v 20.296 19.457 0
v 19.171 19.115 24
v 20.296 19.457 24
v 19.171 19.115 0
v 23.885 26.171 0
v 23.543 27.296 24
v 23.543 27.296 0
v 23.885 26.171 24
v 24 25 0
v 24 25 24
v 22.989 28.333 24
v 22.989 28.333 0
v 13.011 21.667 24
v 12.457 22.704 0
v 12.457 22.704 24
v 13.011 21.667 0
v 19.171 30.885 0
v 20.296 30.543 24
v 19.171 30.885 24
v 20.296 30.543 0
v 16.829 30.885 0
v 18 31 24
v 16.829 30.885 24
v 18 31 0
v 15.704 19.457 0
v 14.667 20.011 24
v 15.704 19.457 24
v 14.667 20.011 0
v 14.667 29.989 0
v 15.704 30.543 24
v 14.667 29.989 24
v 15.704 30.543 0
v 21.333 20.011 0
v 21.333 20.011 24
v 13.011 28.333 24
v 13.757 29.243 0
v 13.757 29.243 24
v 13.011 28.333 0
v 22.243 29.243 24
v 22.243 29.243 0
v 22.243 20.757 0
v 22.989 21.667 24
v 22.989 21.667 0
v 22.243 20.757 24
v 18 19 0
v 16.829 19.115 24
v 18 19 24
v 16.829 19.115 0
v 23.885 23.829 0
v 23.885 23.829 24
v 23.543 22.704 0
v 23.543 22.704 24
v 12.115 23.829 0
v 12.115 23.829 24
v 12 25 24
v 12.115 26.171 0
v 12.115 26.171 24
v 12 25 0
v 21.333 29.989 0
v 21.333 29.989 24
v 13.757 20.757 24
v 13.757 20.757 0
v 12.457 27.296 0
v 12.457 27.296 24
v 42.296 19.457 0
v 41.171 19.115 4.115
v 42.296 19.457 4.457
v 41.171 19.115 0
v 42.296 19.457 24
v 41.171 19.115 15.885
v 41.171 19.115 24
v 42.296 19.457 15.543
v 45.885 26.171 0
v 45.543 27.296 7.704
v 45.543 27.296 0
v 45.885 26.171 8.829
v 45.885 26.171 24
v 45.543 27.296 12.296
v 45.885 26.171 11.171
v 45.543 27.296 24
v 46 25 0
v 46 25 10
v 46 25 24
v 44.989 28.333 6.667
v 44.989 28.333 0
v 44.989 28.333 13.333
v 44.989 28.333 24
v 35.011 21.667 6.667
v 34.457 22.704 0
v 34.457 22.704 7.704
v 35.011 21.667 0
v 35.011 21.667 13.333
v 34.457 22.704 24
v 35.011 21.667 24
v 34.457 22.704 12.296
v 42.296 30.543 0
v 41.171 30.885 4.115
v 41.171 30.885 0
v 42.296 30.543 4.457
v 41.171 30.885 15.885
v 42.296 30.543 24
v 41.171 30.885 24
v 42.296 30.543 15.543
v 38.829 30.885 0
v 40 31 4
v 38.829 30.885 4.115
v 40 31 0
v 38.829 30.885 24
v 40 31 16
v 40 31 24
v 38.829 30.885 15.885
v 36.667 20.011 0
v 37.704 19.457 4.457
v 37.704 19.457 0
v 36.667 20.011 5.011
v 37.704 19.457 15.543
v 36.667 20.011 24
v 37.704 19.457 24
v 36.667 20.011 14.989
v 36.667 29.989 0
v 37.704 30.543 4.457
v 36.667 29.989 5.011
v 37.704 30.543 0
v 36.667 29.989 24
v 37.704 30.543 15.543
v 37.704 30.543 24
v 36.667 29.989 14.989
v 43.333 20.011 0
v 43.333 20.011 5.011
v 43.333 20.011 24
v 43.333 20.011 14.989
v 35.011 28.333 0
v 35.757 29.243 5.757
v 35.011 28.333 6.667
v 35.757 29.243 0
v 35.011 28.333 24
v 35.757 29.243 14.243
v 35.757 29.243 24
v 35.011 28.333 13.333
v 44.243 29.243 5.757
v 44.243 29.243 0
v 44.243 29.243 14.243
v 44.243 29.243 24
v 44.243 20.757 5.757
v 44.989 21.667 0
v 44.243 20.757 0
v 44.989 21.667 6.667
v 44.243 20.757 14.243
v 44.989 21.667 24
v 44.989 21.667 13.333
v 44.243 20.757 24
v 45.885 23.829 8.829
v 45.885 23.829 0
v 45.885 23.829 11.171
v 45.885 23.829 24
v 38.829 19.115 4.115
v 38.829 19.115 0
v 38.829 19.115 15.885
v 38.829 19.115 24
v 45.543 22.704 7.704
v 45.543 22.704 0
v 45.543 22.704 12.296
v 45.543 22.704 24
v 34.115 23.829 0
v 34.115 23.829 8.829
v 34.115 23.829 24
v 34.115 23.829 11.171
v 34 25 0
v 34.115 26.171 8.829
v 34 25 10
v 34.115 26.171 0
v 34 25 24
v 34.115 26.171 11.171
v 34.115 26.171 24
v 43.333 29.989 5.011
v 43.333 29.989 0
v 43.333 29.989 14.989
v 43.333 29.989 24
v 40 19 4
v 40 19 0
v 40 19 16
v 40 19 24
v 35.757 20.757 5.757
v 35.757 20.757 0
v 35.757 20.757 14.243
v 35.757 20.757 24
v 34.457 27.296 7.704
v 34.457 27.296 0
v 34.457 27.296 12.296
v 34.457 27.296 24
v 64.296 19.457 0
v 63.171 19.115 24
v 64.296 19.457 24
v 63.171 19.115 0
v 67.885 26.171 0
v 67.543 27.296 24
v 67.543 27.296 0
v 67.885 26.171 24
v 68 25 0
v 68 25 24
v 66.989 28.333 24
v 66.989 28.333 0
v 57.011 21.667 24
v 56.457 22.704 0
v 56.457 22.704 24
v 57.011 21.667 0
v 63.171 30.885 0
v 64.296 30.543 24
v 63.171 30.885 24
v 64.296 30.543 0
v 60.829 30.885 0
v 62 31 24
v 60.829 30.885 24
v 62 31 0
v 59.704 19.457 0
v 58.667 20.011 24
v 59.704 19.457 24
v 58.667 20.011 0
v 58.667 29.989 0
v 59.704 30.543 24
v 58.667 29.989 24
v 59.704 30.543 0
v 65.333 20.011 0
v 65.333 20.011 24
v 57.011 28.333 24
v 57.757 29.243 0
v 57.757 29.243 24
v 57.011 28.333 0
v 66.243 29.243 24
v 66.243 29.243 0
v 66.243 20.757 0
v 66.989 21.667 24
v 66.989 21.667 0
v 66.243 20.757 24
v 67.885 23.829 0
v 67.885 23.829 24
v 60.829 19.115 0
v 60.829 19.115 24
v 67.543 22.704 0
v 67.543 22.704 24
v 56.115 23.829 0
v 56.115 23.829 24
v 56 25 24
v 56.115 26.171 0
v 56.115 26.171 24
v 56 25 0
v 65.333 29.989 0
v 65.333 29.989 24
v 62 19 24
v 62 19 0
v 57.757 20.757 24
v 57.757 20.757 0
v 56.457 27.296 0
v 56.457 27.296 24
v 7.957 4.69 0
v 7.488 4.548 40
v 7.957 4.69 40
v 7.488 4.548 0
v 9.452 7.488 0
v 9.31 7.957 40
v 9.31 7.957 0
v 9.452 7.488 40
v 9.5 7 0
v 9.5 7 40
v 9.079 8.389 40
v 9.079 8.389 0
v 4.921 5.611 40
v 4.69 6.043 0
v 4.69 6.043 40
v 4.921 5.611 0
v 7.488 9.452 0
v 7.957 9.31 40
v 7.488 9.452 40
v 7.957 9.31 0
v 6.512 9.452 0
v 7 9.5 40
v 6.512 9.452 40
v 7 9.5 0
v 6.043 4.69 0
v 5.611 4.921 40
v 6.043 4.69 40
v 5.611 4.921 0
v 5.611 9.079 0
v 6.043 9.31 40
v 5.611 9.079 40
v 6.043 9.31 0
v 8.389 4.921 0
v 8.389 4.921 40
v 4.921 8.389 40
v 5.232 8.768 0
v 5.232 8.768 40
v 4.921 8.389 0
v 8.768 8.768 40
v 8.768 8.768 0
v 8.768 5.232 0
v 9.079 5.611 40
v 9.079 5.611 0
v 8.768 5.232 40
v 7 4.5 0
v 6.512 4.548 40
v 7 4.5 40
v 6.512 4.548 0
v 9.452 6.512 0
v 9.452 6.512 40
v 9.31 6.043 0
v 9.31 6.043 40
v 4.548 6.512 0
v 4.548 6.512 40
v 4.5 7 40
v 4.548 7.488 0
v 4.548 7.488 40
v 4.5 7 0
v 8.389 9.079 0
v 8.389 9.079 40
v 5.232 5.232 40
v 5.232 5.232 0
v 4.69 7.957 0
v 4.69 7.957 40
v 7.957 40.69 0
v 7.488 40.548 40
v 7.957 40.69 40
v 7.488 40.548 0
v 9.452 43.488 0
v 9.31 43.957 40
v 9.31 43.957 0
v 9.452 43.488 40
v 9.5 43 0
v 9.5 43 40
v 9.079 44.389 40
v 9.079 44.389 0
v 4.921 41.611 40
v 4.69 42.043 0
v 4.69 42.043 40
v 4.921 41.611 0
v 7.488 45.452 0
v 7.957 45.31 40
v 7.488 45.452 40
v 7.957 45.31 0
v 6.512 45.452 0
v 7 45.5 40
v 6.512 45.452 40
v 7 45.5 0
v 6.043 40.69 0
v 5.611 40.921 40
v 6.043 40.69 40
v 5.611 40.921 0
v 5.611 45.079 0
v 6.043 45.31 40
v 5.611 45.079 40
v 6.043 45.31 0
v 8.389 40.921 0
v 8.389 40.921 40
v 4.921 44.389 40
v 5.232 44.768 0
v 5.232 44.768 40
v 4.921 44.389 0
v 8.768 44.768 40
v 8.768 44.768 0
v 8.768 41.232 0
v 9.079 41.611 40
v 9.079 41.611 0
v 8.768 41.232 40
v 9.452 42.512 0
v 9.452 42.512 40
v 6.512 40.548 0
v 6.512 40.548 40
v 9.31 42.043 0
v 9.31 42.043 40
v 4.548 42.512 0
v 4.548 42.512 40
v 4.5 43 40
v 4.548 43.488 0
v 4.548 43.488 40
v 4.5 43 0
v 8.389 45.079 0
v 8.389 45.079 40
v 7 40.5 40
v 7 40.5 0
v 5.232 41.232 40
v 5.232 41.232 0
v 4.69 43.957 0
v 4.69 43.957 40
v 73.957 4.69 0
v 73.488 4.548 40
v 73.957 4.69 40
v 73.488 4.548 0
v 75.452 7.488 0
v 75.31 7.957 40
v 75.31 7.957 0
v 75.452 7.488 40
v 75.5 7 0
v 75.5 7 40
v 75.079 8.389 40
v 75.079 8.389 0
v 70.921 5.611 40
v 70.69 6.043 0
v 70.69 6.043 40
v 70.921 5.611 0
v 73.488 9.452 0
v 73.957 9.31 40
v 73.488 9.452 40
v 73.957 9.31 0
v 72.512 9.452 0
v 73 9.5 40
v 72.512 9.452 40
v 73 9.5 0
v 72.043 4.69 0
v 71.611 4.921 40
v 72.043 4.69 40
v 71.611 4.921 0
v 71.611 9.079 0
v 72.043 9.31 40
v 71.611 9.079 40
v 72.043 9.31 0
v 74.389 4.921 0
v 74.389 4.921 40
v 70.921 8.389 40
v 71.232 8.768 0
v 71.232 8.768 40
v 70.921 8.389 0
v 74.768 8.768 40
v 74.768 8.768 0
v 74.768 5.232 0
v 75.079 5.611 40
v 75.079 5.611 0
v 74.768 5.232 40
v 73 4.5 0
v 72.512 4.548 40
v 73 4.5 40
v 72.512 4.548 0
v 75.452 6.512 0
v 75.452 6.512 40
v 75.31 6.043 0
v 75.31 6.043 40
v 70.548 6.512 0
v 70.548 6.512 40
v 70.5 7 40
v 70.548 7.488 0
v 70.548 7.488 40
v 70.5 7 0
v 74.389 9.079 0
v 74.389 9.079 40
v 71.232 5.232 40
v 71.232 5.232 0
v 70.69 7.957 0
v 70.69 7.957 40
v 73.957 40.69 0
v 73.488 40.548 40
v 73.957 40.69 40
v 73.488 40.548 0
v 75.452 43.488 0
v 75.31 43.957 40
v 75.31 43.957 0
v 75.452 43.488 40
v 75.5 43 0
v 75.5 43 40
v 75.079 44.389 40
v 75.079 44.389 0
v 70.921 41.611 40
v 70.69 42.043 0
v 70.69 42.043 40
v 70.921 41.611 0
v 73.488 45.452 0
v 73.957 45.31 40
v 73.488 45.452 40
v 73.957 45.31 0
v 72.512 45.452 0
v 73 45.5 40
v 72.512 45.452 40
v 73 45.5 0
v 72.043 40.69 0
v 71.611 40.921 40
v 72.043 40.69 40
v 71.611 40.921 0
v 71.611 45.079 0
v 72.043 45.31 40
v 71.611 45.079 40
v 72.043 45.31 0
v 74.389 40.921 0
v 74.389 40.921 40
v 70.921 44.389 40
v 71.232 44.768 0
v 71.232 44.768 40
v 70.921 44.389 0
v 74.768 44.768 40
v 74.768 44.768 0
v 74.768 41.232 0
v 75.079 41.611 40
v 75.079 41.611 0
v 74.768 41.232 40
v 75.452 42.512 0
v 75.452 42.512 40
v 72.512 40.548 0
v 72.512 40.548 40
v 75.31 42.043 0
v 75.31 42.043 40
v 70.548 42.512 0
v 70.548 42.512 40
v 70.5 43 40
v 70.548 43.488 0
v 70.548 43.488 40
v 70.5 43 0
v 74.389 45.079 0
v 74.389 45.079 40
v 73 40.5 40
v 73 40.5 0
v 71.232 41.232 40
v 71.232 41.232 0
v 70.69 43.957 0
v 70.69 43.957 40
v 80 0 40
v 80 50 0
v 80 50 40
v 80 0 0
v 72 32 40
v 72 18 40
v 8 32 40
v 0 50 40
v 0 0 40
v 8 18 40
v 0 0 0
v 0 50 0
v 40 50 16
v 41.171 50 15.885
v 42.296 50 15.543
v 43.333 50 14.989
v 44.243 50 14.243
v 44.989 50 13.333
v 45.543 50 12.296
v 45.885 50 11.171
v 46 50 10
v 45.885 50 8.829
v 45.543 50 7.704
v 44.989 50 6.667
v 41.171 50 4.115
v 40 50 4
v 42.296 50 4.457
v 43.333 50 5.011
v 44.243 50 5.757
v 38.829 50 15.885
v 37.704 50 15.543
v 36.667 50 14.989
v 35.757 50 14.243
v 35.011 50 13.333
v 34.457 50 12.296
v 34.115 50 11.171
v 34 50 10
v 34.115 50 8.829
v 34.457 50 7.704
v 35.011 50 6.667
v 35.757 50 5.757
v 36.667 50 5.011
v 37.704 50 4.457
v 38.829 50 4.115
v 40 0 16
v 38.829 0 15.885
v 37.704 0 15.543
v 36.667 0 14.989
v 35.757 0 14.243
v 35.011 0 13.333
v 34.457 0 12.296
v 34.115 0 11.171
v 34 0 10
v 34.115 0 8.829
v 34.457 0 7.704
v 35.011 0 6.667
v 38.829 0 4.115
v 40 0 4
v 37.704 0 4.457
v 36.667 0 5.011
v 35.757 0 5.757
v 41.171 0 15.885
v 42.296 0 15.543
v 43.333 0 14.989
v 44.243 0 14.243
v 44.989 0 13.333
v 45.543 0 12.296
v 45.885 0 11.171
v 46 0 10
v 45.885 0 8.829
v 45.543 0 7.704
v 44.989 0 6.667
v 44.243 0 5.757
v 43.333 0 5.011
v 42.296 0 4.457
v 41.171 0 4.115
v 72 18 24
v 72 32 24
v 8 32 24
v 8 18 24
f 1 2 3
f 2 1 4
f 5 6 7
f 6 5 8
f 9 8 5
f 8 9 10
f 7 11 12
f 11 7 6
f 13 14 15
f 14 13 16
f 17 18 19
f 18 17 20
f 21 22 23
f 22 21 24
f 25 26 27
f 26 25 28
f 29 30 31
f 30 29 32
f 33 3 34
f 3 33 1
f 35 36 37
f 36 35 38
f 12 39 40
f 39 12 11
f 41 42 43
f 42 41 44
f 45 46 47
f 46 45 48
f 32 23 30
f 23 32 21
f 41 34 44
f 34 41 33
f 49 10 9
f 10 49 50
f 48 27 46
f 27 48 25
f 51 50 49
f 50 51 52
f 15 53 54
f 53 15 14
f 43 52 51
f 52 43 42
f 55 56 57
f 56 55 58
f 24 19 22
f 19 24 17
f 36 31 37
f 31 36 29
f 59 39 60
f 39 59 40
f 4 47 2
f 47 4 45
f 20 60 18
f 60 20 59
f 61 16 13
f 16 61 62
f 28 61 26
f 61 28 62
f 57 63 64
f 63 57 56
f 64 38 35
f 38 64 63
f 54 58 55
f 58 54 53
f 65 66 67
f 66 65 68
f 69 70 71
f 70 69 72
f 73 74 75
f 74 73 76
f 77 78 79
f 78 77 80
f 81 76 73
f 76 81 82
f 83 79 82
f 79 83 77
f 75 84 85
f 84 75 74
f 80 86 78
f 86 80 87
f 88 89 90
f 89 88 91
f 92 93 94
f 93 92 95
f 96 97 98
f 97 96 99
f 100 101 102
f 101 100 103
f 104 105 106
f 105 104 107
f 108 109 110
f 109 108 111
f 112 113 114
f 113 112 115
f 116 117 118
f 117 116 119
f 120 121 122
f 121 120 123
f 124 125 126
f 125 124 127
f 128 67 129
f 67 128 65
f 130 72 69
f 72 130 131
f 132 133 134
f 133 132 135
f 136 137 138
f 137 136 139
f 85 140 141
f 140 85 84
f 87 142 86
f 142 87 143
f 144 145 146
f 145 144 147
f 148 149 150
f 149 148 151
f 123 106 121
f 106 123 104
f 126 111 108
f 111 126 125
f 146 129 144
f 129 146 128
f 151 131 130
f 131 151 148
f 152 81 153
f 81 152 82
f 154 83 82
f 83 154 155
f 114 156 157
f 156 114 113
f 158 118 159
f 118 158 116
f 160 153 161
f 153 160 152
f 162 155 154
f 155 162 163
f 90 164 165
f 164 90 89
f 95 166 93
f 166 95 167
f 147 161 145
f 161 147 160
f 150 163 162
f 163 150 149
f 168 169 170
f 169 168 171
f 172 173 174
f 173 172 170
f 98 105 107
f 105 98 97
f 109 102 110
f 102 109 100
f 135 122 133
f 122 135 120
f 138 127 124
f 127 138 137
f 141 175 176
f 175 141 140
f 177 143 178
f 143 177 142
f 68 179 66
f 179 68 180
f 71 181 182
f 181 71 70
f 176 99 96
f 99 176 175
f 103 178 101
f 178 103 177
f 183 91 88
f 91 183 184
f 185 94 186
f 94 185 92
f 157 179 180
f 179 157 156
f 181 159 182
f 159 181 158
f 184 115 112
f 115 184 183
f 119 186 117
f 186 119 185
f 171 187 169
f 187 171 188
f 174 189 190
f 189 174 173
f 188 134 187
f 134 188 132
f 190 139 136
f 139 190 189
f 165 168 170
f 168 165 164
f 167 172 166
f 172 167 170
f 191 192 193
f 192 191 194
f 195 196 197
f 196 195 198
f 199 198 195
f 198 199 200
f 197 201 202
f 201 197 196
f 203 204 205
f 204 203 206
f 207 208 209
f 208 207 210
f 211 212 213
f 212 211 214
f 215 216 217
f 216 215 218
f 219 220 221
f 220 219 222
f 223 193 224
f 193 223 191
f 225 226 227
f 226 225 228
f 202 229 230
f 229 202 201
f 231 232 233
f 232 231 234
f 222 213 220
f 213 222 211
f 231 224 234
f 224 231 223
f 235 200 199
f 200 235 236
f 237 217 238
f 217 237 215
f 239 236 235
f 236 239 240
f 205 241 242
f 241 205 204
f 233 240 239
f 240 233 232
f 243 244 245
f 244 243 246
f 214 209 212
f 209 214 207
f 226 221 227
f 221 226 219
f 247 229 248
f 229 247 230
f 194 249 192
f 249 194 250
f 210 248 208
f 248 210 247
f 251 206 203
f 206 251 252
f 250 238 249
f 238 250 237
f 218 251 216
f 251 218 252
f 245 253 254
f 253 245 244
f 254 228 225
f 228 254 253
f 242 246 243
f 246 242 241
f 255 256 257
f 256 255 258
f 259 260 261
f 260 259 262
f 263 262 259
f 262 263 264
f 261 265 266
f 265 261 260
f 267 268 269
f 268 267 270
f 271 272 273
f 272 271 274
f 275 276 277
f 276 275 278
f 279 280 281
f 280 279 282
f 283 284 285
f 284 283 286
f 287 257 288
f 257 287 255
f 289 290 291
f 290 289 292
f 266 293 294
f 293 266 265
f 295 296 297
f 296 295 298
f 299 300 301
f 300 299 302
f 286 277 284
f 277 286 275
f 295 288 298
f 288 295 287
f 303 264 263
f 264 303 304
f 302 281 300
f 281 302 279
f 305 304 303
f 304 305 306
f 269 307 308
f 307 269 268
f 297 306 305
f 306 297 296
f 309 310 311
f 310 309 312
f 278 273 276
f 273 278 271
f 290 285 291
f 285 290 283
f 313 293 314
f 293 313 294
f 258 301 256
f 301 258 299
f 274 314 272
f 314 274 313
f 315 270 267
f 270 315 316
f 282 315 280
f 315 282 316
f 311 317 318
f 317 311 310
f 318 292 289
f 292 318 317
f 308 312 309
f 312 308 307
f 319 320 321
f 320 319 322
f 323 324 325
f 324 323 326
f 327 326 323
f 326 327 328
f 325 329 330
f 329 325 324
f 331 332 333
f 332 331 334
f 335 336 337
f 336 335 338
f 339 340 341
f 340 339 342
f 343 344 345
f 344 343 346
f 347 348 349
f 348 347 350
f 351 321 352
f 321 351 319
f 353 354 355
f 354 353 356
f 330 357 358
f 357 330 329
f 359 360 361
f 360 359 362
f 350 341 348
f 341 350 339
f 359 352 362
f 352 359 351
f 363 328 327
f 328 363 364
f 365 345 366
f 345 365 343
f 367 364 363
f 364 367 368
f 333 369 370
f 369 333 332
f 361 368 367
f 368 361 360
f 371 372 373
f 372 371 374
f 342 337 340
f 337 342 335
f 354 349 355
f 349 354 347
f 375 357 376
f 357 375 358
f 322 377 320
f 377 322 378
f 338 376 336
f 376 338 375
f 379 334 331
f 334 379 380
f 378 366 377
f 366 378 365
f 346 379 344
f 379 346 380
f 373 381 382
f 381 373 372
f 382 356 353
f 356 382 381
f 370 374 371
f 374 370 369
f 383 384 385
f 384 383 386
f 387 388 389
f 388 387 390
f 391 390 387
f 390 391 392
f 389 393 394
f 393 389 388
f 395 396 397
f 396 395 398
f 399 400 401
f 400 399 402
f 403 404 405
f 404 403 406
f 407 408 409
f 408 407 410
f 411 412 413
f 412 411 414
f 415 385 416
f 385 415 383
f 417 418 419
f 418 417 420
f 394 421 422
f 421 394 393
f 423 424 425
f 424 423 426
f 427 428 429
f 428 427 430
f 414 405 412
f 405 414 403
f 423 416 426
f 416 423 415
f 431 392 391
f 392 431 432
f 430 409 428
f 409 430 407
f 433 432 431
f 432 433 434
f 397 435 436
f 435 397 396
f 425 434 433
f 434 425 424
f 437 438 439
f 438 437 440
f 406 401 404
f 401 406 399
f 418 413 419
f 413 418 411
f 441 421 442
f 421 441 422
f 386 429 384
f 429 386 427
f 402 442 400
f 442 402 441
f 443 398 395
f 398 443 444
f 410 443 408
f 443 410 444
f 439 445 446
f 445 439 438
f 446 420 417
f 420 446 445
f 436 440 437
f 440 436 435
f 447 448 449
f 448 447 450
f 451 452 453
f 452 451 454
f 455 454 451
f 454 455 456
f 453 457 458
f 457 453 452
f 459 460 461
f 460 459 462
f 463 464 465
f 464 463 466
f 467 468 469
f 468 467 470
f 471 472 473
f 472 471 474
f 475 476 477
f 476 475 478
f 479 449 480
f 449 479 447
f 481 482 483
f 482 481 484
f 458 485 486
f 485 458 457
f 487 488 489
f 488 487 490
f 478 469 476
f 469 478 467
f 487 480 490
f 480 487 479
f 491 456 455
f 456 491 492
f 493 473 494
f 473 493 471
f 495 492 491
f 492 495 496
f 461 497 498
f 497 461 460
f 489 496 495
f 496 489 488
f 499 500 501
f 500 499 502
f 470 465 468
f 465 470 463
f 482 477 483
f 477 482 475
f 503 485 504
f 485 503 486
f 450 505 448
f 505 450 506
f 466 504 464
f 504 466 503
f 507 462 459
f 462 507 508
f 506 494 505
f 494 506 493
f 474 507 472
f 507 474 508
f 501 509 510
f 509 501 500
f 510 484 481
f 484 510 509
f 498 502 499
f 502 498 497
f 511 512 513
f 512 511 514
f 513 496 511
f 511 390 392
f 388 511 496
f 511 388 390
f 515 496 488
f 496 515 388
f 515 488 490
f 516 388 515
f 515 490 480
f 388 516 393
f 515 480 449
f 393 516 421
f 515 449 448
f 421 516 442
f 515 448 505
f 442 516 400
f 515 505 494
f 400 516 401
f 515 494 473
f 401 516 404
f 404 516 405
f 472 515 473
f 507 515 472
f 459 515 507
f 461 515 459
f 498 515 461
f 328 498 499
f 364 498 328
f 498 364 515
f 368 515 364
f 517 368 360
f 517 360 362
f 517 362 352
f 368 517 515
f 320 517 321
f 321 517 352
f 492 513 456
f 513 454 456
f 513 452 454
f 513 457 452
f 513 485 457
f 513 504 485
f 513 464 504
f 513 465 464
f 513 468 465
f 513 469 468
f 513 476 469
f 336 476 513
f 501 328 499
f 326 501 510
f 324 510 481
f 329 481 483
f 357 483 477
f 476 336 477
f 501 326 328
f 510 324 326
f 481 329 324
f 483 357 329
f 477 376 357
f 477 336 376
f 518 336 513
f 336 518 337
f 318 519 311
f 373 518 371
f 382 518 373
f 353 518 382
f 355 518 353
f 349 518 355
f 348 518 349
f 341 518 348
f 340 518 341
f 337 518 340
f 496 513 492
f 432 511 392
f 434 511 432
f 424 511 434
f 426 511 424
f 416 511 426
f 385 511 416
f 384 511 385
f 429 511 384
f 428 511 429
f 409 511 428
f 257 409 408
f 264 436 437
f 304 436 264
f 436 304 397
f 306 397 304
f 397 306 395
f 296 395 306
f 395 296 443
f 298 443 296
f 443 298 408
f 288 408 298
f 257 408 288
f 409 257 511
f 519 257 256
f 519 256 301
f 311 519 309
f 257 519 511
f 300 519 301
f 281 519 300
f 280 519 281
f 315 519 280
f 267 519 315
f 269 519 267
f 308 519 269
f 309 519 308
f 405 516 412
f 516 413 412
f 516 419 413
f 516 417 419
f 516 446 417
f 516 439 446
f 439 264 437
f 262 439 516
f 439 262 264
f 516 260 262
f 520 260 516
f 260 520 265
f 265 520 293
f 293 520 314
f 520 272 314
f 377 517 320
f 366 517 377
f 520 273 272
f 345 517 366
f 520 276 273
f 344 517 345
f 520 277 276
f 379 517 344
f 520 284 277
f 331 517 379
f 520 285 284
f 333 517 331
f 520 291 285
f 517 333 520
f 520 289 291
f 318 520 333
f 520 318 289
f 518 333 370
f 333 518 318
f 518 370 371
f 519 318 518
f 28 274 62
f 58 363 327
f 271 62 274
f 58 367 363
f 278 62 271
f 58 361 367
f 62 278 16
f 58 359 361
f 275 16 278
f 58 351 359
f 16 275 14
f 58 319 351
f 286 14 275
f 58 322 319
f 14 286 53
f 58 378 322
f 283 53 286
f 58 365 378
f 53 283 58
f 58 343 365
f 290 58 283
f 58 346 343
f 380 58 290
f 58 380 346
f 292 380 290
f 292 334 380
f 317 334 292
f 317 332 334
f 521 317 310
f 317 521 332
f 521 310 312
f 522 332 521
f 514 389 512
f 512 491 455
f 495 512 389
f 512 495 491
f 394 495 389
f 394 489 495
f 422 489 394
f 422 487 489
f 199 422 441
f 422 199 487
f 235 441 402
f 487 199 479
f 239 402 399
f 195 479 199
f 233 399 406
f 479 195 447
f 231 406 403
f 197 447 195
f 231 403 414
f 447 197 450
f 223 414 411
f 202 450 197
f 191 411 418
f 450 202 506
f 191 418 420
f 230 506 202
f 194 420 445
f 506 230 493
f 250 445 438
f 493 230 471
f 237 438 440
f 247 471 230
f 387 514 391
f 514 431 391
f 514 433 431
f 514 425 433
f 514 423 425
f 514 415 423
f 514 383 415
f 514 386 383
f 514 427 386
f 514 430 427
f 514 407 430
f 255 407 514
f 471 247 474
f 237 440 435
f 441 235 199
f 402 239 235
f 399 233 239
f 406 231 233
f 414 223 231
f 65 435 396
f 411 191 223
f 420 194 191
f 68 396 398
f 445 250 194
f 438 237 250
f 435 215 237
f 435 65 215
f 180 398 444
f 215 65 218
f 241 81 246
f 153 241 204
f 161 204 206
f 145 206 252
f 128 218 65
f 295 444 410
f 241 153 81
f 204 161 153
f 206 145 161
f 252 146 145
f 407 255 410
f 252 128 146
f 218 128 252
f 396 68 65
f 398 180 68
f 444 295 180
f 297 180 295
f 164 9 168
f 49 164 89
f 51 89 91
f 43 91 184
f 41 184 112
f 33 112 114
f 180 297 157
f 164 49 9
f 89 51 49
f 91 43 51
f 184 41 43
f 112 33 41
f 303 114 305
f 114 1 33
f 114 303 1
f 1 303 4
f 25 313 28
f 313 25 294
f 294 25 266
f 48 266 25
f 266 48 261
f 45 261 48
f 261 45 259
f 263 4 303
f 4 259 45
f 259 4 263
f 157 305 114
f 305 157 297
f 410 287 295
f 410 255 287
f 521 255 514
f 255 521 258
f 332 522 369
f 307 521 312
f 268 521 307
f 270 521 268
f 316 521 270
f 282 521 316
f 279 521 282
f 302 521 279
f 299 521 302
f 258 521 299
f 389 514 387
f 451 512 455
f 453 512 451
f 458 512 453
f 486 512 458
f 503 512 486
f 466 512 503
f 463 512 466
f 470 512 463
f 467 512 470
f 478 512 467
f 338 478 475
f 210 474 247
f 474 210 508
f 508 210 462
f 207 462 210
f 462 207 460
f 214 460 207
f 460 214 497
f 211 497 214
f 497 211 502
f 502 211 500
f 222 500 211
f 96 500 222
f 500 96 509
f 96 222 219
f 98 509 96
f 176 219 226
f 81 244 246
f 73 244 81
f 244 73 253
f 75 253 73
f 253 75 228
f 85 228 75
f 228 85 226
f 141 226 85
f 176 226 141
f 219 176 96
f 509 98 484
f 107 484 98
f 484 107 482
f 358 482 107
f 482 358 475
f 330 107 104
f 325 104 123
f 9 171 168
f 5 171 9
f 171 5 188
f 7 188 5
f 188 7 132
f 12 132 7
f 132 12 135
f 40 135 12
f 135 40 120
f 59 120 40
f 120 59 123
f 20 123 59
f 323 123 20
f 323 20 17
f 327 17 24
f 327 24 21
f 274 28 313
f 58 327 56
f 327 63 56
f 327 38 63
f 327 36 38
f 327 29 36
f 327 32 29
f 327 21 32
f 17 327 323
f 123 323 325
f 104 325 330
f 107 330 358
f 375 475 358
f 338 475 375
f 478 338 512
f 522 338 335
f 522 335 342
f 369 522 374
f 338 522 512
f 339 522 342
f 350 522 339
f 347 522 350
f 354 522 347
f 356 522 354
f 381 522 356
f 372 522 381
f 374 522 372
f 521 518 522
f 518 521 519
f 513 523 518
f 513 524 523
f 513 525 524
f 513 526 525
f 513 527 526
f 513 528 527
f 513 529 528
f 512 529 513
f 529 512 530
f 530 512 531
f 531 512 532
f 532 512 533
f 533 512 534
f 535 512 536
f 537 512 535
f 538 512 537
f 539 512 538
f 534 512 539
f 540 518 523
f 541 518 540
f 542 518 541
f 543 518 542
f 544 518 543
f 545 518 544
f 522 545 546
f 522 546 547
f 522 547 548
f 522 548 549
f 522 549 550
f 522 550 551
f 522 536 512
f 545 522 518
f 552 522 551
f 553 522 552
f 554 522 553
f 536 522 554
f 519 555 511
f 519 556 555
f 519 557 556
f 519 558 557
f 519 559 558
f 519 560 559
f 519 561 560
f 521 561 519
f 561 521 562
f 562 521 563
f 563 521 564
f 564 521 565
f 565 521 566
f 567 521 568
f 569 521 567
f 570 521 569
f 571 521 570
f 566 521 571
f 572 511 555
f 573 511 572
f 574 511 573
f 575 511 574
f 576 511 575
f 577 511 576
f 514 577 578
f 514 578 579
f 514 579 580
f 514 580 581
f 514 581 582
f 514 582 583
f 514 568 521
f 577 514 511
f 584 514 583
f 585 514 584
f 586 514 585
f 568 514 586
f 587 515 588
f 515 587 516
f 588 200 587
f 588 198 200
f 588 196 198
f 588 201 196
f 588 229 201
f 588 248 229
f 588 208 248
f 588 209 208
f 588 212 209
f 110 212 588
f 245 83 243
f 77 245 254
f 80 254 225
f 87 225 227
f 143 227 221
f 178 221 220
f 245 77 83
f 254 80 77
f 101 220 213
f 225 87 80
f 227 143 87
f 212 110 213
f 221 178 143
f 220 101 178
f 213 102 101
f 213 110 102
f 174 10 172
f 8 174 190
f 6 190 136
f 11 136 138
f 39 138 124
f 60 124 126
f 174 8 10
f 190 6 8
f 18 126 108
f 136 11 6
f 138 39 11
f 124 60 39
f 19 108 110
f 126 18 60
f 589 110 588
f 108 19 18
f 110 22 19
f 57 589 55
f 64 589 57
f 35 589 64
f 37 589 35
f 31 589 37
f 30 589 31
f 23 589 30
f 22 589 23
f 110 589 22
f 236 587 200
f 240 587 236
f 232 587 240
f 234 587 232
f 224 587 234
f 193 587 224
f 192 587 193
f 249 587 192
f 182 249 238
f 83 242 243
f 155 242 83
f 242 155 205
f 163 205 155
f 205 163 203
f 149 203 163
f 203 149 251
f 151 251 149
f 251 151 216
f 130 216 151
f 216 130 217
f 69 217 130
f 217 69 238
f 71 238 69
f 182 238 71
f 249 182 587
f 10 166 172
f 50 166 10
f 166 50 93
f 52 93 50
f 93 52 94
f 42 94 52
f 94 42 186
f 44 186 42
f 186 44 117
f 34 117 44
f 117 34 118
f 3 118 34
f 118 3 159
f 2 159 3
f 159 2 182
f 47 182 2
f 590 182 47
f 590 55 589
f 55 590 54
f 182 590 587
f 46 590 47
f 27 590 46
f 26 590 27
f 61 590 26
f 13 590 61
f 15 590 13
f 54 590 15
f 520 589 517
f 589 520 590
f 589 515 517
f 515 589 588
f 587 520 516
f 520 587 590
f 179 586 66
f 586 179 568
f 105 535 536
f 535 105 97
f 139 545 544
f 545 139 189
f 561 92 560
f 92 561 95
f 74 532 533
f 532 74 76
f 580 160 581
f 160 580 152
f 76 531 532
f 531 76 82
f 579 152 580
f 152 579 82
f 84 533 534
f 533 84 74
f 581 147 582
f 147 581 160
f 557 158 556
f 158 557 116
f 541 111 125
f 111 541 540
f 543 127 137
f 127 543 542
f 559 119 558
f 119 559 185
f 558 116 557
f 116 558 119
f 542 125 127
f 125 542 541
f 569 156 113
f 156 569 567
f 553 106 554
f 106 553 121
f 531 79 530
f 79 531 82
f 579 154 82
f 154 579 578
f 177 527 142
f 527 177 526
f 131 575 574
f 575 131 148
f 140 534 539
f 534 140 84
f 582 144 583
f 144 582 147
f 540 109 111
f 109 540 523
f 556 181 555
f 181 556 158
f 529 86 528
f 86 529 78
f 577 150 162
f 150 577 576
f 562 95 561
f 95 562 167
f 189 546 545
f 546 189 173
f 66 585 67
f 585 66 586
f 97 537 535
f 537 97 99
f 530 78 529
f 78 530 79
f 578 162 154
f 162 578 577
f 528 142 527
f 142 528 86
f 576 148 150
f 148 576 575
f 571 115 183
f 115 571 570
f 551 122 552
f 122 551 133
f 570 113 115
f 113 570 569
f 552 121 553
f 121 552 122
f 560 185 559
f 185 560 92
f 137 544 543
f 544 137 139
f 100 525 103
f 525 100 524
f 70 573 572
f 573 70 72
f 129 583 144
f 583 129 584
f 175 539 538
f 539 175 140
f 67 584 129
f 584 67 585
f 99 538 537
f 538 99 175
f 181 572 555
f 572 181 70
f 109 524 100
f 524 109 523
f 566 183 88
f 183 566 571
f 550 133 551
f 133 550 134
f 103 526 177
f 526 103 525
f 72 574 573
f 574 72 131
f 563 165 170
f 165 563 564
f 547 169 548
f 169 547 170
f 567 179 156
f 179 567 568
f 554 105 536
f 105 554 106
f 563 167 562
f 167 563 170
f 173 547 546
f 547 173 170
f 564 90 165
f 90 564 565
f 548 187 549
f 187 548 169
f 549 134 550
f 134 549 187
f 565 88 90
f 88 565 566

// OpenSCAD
$fn = 32;

// ----------------------------------------------------------------------
// Manifold block: side_outlet manifold
// ----------------------------------------------------------------------

// --- parameters (mm) ---
block_l = 80;             // block length, X
block_w = 50;             // block width, Y
block_h = 40;             // block height, Z
port_d = 12;              // port bore diameter
port_pitch = 22;          // port pitch along X
gallery_d = 14;           // top gallery width, Y
gallery_depth = 16;       // gallery pocket depth
wall_p = 8;               // gallery end wall thickness, X
mnt_d = 5;                // mounting hole diameter
mnt_in = 7;               // mounting hole inset from the edges
out_d = 12;               // outlet bore diameter
out_z = 10;               // outlet axis height

n_ports = 3;  // ports in the row
port_x0 = (block_l - (n_ports - 1) * port_pitch) / 2;  // first port X

difference() {
  cube([block_l, block_w, block_h]);
  for (i = [0 : n_ports - 1])
    translate([port_x0 + i * port_pitch, block_w / 2, -1])
      cylinder(h = block_h + 2, d = port_d);
  translate([wall_p, block_w / 2 - gallery_d / 2, block_h - gallery_depth])
    cube([block_l - 2 * wall_p, gallery_d, gallery_depth + 1]);
  for (cx = [mnt_in, block_l - mnt_in])
    for (cy = [mnt_in, block_w - mnt_in])
      translate([cx, cy, -1]) cylinder(h = block_h + 2, d = mnt_d);
  translate([block_l / 2, -1, out_z]) rotate([-90, 0, 0])
    cylinder(h = block_w + 2, d = out_d);
}
